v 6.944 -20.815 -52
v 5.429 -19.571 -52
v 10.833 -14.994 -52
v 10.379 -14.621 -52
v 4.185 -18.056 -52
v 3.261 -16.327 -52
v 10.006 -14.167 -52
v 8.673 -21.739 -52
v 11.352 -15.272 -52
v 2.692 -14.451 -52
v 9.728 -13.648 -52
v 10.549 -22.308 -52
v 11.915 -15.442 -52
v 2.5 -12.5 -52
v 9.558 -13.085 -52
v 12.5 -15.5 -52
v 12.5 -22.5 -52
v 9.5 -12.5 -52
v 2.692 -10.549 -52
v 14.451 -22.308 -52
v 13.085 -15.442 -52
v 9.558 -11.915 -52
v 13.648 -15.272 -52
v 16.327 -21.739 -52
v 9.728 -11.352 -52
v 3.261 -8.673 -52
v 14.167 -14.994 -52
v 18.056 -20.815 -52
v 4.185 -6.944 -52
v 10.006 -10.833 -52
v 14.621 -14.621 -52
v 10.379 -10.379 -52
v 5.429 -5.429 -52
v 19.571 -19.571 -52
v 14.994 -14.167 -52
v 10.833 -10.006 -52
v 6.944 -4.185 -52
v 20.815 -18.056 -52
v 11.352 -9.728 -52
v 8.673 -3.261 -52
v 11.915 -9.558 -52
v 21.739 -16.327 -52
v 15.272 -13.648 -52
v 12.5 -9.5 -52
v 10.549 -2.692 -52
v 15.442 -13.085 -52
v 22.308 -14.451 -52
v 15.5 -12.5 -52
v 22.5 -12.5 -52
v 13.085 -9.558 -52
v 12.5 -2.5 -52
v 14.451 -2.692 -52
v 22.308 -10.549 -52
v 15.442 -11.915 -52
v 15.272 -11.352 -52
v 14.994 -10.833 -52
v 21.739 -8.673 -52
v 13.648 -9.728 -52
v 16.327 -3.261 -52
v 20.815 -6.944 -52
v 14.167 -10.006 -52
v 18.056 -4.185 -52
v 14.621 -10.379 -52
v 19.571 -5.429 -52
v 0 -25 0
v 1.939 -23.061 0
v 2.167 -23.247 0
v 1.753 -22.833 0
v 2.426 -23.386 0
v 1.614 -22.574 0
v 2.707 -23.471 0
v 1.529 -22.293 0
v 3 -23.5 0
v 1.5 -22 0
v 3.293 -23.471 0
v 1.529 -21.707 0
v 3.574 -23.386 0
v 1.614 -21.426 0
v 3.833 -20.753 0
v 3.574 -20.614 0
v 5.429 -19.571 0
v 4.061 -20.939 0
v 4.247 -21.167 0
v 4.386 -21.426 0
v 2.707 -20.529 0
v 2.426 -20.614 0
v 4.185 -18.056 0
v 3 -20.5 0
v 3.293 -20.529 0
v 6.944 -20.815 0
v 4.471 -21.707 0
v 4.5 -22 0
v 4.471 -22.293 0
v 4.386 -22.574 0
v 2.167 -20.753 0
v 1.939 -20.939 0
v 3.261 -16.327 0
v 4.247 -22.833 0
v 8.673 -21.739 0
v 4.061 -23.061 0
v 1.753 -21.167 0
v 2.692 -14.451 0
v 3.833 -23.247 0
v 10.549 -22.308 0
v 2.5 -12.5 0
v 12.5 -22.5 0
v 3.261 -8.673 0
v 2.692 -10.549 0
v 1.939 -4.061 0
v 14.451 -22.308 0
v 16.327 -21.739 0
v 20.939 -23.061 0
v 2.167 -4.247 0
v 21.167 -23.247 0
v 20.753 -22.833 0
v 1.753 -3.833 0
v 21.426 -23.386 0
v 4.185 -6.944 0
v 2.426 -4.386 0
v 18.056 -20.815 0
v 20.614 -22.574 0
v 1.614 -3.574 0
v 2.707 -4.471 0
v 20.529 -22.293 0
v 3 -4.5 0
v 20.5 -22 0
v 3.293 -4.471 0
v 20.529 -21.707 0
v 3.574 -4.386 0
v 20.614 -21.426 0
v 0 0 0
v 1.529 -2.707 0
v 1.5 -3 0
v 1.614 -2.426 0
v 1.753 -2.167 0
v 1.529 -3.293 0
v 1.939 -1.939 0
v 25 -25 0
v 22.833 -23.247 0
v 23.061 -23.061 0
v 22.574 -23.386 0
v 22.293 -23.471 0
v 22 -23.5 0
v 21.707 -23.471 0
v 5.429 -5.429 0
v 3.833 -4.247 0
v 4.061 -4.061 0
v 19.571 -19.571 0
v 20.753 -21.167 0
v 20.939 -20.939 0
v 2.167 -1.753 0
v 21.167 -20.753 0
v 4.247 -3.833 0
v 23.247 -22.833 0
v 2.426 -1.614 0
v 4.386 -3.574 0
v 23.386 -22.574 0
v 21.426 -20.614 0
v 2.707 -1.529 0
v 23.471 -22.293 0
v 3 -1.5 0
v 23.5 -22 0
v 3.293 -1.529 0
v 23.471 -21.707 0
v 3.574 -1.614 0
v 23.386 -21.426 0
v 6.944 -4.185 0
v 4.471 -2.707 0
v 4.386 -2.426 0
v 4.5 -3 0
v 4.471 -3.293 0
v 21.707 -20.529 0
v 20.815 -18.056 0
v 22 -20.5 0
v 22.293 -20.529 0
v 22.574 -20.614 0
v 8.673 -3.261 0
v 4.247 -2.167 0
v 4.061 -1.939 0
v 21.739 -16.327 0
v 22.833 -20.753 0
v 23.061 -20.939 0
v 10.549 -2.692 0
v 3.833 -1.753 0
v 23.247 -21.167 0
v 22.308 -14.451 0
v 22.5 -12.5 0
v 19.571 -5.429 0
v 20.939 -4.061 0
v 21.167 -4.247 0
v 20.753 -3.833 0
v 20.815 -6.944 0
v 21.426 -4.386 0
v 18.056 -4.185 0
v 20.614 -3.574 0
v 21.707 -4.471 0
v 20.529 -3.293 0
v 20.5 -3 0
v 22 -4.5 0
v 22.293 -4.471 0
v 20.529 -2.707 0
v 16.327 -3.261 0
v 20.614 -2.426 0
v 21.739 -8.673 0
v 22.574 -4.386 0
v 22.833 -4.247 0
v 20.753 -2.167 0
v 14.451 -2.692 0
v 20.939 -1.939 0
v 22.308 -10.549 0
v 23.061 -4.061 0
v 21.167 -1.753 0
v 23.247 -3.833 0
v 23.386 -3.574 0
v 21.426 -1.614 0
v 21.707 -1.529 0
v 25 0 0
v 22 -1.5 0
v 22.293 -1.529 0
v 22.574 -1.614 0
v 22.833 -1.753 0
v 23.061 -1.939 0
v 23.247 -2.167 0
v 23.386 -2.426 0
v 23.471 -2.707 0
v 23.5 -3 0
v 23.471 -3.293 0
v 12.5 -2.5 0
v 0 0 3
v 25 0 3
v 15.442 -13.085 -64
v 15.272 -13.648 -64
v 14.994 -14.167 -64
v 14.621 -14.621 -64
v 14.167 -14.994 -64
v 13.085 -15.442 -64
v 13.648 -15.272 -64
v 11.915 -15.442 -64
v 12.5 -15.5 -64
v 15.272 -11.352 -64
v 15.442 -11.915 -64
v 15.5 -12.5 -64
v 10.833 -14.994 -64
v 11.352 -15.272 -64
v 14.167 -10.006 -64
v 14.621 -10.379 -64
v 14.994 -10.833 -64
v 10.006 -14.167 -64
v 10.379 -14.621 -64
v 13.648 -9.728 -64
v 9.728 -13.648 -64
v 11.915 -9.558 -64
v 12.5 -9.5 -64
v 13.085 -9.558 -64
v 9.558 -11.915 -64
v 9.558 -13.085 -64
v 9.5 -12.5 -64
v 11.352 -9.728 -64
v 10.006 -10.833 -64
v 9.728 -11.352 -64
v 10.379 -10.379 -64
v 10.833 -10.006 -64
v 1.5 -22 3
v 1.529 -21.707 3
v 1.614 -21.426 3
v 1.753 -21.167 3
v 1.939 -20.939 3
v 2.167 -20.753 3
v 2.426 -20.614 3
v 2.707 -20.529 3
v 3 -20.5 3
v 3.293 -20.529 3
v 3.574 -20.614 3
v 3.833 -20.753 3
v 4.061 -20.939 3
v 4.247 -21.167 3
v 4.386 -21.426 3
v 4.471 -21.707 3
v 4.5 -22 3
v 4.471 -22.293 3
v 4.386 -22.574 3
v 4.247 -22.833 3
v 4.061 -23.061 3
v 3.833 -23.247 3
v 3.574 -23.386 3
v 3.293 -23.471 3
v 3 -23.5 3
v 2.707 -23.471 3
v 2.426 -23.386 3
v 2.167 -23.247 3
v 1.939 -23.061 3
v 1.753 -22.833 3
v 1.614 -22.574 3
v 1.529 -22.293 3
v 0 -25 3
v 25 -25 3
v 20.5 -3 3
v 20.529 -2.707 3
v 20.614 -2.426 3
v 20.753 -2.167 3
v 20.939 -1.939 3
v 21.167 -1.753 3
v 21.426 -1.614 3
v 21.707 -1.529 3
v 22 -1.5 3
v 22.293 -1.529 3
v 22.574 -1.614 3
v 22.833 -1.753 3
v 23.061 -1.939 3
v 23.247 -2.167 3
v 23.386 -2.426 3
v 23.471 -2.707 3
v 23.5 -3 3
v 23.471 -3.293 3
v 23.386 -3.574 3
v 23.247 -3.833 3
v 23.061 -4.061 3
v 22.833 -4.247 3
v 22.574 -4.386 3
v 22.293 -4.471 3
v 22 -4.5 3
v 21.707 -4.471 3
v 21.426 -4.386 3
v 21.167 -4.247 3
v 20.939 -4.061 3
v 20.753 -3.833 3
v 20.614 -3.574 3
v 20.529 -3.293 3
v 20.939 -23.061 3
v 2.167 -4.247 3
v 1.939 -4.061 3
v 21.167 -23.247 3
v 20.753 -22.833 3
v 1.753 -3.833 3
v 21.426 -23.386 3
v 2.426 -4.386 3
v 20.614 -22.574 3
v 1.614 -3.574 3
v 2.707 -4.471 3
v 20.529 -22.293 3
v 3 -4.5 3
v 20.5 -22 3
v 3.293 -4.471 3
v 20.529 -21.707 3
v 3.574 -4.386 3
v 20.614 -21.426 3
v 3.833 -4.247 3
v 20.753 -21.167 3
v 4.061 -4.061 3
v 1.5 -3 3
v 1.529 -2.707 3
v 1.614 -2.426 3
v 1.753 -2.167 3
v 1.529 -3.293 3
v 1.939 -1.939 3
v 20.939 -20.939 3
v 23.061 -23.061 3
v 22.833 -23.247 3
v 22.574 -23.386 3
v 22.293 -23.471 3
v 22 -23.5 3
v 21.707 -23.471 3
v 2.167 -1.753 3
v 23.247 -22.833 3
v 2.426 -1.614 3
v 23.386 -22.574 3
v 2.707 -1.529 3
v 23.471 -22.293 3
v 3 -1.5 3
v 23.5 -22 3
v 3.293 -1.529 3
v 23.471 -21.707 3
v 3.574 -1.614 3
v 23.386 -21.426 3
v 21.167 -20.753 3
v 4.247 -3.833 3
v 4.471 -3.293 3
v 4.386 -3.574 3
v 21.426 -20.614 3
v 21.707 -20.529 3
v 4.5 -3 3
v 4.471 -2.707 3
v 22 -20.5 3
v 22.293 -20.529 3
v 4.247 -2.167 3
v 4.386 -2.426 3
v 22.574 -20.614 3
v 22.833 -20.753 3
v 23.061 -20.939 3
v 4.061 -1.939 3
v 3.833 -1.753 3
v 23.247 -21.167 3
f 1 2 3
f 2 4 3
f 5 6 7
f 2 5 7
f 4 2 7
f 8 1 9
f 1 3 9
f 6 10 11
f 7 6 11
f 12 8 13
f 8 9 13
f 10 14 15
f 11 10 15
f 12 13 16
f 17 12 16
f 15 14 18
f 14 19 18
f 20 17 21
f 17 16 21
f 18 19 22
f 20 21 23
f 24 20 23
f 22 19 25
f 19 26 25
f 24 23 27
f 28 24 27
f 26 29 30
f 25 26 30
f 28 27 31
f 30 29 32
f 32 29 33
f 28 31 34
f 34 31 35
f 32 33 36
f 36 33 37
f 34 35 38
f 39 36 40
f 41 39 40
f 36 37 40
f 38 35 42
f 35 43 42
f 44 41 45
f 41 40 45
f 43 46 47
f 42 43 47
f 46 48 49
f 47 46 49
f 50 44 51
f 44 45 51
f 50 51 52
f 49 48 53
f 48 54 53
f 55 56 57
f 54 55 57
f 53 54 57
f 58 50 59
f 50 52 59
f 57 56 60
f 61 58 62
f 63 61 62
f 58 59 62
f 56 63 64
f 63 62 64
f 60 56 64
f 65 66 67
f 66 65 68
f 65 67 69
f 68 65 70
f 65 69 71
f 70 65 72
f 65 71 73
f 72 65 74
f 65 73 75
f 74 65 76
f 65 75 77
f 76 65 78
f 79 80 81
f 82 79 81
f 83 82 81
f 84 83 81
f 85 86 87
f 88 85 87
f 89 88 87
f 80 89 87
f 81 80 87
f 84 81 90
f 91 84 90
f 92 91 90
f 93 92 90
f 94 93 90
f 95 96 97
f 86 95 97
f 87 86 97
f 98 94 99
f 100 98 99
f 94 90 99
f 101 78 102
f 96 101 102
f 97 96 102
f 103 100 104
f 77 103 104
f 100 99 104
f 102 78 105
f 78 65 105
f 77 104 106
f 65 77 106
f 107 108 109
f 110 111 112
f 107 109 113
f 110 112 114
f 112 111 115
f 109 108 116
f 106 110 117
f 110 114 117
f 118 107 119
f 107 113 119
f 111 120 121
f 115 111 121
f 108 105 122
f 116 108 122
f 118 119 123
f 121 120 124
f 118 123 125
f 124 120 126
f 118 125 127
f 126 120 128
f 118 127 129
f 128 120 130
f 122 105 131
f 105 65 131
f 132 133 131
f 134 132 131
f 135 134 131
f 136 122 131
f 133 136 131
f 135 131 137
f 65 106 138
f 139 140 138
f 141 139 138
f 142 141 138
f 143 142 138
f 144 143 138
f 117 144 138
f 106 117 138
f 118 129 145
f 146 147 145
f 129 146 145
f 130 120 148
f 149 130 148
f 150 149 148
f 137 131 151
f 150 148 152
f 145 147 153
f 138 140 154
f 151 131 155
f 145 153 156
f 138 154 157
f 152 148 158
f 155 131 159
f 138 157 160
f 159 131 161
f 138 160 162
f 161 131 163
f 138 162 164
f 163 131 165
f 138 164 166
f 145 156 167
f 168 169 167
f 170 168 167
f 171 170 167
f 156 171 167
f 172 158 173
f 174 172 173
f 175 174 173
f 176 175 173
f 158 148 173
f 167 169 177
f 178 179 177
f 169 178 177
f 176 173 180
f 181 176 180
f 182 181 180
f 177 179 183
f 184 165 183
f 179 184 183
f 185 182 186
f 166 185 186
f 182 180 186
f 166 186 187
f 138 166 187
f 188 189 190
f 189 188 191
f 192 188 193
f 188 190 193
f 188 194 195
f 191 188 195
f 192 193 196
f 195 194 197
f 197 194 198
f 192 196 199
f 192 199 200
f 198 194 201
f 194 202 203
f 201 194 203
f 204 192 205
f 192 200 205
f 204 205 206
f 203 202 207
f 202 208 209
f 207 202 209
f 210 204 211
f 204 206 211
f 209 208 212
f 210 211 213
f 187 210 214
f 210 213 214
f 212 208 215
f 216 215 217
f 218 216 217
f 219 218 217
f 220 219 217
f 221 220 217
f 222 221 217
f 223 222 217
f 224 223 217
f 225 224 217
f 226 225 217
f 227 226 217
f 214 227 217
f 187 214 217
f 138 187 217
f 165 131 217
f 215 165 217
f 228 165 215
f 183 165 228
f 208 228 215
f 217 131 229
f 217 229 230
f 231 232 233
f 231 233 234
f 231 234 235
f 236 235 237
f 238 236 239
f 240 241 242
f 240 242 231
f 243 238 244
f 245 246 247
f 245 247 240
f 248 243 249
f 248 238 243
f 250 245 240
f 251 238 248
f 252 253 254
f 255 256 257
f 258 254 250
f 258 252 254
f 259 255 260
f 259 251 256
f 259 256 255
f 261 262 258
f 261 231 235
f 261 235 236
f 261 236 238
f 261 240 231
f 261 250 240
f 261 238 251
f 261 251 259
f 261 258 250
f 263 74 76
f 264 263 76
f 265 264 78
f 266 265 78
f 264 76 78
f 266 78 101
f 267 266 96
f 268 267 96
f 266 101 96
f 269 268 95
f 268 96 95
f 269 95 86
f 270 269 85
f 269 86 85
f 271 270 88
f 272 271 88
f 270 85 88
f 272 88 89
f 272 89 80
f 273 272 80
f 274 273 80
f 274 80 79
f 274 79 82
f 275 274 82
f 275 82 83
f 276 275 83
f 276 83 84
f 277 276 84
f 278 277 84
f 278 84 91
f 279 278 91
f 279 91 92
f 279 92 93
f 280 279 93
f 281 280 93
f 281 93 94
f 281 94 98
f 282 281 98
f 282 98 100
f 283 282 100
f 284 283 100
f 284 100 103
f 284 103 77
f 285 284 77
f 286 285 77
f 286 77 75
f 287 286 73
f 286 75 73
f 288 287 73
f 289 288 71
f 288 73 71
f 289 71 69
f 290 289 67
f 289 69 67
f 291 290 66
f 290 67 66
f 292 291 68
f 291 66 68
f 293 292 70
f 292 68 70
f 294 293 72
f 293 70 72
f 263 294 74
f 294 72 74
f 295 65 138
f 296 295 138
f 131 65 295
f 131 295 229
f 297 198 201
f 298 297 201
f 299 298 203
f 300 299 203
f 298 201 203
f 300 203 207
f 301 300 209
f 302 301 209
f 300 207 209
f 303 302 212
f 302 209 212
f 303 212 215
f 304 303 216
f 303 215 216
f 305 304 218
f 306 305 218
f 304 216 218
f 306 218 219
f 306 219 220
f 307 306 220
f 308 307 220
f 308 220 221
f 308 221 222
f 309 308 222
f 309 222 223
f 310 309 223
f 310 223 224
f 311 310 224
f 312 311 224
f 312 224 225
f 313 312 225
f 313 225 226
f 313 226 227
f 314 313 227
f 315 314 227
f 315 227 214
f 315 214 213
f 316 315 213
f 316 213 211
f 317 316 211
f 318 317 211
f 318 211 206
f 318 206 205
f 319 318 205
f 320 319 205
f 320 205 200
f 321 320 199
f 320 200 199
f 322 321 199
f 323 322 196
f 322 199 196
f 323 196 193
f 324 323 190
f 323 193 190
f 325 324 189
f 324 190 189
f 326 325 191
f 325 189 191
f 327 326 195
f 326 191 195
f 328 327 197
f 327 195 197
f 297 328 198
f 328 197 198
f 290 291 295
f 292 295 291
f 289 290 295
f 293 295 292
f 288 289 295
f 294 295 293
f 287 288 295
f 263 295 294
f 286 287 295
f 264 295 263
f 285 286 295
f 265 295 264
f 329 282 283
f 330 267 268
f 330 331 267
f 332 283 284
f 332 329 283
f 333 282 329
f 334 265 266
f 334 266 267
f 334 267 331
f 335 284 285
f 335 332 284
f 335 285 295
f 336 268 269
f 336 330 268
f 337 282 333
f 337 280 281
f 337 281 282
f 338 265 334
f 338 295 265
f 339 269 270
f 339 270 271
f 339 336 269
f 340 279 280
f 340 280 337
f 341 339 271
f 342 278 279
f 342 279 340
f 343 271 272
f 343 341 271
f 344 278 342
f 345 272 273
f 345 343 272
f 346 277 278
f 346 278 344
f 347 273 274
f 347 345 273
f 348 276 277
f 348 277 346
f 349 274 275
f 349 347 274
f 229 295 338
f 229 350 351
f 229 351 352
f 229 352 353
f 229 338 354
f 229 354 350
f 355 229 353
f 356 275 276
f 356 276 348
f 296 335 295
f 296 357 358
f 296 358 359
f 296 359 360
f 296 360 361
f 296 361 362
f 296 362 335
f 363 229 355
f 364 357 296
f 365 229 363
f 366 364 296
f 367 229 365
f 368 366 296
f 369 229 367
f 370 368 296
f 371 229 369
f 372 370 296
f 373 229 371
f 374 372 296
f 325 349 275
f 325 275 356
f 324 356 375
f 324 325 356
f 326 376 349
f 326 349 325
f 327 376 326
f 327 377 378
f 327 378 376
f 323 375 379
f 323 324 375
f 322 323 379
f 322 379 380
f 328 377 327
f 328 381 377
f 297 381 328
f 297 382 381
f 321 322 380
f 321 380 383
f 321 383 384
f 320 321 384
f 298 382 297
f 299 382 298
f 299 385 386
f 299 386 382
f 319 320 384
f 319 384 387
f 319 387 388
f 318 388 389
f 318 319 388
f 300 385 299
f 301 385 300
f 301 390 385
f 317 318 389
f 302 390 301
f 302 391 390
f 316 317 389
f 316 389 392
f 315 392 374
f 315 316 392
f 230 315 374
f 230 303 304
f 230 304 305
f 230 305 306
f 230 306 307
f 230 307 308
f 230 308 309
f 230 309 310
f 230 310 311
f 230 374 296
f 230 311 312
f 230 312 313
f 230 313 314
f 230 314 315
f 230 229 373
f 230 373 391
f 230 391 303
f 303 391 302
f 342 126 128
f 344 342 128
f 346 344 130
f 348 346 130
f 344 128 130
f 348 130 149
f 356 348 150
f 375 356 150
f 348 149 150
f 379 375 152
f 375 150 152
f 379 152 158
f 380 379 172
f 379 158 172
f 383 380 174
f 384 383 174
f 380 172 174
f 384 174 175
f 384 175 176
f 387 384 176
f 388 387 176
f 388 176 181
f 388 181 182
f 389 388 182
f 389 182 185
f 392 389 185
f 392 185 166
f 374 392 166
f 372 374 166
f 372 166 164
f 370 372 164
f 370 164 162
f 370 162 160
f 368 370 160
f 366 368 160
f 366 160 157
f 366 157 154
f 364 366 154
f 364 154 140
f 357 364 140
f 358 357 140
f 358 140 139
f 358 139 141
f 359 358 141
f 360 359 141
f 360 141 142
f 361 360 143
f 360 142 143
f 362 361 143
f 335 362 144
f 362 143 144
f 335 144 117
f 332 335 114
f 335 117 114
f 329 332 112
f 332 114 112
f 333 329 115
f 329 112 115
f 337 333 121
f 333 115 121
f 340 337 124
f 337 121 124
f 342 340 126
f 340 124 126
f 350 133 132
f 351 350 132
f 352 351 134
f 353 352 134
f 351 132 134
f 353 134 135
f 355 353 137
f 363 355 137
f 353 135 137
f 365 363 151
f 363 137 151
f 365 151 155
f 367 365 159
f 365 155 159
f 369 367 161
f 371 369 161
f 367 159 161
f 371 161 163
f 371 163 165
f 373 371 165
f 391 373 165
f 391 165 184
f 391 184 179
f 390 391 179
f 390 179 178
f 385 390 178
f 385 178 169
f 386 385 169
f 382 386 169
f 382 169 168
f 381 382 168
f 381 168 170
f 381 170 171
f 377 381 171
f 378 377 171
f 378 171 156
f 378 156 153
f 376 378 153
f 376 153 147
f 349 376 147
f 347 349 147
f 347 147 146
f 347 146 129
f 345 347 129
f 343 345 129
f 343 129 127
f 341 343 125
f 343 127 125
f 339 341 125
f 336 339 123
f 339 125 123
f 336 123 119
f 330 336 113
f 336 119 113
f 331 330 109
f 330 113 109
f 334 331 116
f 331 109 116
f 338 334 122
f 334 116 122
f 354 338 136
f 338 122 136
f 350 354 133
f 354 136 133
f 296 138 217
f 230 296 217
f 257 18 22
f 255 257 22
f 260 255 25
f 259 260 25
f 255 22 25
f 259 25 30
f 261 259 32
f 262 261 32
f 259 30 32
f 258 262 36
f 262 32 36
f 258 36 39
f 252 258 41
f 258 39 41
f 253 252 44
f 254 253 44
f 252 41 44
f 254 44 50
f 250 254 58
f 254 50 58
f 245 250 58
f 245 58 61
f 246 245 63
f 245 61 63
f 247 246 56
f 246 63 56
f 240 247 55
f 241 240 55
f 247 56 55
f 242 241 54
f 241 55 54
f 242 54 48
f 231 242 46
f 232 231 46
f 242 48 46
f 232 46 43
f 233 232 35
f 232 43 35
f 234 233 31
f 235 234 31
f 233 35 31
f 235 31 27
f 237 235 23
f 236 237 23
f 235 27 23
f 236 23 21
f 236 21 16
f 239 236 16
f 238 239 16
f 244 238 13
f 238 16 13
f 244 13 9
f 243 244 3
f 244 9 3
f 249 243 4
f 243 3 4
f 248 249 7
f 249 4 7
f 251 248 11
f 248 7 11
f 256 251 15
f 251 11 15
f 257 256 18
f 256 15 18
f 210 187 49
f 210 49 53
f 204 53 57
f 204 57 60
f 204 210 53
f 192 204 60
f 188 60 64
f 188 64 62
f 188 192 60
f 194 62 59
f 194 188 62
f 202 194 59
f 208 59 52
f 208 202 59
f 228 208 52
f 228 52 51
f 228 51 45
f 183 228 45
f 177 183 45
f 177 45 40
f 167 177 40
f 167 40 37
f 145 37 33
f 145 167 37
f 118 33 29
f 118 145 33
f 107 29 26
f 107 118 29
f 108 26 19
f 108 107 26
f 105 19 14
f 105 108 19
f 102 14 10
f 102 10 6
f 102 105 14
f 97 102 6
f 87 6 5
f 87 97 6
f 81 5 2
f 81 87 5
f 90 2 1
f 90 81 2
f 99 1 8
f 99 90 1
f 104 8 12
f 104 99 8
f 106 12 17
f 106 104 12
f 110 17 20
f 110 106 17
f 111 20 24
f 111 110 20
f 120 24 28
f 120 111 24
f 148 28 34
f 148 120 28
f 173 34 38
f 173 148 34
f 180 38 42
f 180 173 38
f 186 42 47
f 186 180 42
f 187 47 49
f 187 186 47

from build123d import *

# Parameters (mm, degrees)
SKETCH_2_W          = 25
SKETCH_2_H          = 25
EXTRUDE_1_DEPTH     = 3
SKETCH_3_R          = 1.5
CUT_EXTRUDE_2_DEPTH = 4
EXTRUDE_START       = -3
SKETCH_4_R          = 10
EXTRUDE_2_DEPTH     = 52
SKETCH_5_R          = 3
EXTRUDE_3_DEPTH     = 12


with BuildPart() as part:
    # 草图2 → 凸台-拉伸1 (new body)
    with BuildSketch(Plane.XY):
        with Locations((12.5, -12.5)):
            Rectangle(SKETCH_2_W, SKETCH_2_H)
    extrude(amount=EXTRUDE_1_DEPTH)

    # 草图3 → 切除-拉伸2 (cut, through all)
    with BuildSketch(Plane(origin=(0, 0, 0), x_dir=(-1, 0, 0), z_dir=(0, 0, -1))):
        with Locations((-22, -3)):
            Circle(SKETCH_3_R)
        with Locations((-3, -3)):
            Circle(SKETCH_3_R)
        with Locations((-3, -22)):
            Circle(SKETCH_3_R)
        with Locations((-22, -22)):
            Circle(SKETCH_3_R)
    extrude(amount=-CUT_EXTRUDE_2_DEPTH, mode=Mode.SUBTRACT)

    # 草图4 → 凸台-拉伸2 (add)
    with BuildSketch(Plane.XY.offset(3).offset(EXTRUDE_START)):
        with Locations((12.5, -12.5)):
            Circle(SKETCH_4_R)
    extrude(amount=-EXTRUDE_2_DEPTH)

    # 草图5 → 凸台-拉伸3 (add)
    with BuildSketch(Plane(origin=(0, 0, -52), x_dir=(-1, 0, 0), z_dir=(0, 0, -1))):
        with Locations((-12.5, -12.5)):
            Circle(SKETCH_5_R)
    extrude(amount=EXTRUDE_3_DEPTH)


solid = part.part
